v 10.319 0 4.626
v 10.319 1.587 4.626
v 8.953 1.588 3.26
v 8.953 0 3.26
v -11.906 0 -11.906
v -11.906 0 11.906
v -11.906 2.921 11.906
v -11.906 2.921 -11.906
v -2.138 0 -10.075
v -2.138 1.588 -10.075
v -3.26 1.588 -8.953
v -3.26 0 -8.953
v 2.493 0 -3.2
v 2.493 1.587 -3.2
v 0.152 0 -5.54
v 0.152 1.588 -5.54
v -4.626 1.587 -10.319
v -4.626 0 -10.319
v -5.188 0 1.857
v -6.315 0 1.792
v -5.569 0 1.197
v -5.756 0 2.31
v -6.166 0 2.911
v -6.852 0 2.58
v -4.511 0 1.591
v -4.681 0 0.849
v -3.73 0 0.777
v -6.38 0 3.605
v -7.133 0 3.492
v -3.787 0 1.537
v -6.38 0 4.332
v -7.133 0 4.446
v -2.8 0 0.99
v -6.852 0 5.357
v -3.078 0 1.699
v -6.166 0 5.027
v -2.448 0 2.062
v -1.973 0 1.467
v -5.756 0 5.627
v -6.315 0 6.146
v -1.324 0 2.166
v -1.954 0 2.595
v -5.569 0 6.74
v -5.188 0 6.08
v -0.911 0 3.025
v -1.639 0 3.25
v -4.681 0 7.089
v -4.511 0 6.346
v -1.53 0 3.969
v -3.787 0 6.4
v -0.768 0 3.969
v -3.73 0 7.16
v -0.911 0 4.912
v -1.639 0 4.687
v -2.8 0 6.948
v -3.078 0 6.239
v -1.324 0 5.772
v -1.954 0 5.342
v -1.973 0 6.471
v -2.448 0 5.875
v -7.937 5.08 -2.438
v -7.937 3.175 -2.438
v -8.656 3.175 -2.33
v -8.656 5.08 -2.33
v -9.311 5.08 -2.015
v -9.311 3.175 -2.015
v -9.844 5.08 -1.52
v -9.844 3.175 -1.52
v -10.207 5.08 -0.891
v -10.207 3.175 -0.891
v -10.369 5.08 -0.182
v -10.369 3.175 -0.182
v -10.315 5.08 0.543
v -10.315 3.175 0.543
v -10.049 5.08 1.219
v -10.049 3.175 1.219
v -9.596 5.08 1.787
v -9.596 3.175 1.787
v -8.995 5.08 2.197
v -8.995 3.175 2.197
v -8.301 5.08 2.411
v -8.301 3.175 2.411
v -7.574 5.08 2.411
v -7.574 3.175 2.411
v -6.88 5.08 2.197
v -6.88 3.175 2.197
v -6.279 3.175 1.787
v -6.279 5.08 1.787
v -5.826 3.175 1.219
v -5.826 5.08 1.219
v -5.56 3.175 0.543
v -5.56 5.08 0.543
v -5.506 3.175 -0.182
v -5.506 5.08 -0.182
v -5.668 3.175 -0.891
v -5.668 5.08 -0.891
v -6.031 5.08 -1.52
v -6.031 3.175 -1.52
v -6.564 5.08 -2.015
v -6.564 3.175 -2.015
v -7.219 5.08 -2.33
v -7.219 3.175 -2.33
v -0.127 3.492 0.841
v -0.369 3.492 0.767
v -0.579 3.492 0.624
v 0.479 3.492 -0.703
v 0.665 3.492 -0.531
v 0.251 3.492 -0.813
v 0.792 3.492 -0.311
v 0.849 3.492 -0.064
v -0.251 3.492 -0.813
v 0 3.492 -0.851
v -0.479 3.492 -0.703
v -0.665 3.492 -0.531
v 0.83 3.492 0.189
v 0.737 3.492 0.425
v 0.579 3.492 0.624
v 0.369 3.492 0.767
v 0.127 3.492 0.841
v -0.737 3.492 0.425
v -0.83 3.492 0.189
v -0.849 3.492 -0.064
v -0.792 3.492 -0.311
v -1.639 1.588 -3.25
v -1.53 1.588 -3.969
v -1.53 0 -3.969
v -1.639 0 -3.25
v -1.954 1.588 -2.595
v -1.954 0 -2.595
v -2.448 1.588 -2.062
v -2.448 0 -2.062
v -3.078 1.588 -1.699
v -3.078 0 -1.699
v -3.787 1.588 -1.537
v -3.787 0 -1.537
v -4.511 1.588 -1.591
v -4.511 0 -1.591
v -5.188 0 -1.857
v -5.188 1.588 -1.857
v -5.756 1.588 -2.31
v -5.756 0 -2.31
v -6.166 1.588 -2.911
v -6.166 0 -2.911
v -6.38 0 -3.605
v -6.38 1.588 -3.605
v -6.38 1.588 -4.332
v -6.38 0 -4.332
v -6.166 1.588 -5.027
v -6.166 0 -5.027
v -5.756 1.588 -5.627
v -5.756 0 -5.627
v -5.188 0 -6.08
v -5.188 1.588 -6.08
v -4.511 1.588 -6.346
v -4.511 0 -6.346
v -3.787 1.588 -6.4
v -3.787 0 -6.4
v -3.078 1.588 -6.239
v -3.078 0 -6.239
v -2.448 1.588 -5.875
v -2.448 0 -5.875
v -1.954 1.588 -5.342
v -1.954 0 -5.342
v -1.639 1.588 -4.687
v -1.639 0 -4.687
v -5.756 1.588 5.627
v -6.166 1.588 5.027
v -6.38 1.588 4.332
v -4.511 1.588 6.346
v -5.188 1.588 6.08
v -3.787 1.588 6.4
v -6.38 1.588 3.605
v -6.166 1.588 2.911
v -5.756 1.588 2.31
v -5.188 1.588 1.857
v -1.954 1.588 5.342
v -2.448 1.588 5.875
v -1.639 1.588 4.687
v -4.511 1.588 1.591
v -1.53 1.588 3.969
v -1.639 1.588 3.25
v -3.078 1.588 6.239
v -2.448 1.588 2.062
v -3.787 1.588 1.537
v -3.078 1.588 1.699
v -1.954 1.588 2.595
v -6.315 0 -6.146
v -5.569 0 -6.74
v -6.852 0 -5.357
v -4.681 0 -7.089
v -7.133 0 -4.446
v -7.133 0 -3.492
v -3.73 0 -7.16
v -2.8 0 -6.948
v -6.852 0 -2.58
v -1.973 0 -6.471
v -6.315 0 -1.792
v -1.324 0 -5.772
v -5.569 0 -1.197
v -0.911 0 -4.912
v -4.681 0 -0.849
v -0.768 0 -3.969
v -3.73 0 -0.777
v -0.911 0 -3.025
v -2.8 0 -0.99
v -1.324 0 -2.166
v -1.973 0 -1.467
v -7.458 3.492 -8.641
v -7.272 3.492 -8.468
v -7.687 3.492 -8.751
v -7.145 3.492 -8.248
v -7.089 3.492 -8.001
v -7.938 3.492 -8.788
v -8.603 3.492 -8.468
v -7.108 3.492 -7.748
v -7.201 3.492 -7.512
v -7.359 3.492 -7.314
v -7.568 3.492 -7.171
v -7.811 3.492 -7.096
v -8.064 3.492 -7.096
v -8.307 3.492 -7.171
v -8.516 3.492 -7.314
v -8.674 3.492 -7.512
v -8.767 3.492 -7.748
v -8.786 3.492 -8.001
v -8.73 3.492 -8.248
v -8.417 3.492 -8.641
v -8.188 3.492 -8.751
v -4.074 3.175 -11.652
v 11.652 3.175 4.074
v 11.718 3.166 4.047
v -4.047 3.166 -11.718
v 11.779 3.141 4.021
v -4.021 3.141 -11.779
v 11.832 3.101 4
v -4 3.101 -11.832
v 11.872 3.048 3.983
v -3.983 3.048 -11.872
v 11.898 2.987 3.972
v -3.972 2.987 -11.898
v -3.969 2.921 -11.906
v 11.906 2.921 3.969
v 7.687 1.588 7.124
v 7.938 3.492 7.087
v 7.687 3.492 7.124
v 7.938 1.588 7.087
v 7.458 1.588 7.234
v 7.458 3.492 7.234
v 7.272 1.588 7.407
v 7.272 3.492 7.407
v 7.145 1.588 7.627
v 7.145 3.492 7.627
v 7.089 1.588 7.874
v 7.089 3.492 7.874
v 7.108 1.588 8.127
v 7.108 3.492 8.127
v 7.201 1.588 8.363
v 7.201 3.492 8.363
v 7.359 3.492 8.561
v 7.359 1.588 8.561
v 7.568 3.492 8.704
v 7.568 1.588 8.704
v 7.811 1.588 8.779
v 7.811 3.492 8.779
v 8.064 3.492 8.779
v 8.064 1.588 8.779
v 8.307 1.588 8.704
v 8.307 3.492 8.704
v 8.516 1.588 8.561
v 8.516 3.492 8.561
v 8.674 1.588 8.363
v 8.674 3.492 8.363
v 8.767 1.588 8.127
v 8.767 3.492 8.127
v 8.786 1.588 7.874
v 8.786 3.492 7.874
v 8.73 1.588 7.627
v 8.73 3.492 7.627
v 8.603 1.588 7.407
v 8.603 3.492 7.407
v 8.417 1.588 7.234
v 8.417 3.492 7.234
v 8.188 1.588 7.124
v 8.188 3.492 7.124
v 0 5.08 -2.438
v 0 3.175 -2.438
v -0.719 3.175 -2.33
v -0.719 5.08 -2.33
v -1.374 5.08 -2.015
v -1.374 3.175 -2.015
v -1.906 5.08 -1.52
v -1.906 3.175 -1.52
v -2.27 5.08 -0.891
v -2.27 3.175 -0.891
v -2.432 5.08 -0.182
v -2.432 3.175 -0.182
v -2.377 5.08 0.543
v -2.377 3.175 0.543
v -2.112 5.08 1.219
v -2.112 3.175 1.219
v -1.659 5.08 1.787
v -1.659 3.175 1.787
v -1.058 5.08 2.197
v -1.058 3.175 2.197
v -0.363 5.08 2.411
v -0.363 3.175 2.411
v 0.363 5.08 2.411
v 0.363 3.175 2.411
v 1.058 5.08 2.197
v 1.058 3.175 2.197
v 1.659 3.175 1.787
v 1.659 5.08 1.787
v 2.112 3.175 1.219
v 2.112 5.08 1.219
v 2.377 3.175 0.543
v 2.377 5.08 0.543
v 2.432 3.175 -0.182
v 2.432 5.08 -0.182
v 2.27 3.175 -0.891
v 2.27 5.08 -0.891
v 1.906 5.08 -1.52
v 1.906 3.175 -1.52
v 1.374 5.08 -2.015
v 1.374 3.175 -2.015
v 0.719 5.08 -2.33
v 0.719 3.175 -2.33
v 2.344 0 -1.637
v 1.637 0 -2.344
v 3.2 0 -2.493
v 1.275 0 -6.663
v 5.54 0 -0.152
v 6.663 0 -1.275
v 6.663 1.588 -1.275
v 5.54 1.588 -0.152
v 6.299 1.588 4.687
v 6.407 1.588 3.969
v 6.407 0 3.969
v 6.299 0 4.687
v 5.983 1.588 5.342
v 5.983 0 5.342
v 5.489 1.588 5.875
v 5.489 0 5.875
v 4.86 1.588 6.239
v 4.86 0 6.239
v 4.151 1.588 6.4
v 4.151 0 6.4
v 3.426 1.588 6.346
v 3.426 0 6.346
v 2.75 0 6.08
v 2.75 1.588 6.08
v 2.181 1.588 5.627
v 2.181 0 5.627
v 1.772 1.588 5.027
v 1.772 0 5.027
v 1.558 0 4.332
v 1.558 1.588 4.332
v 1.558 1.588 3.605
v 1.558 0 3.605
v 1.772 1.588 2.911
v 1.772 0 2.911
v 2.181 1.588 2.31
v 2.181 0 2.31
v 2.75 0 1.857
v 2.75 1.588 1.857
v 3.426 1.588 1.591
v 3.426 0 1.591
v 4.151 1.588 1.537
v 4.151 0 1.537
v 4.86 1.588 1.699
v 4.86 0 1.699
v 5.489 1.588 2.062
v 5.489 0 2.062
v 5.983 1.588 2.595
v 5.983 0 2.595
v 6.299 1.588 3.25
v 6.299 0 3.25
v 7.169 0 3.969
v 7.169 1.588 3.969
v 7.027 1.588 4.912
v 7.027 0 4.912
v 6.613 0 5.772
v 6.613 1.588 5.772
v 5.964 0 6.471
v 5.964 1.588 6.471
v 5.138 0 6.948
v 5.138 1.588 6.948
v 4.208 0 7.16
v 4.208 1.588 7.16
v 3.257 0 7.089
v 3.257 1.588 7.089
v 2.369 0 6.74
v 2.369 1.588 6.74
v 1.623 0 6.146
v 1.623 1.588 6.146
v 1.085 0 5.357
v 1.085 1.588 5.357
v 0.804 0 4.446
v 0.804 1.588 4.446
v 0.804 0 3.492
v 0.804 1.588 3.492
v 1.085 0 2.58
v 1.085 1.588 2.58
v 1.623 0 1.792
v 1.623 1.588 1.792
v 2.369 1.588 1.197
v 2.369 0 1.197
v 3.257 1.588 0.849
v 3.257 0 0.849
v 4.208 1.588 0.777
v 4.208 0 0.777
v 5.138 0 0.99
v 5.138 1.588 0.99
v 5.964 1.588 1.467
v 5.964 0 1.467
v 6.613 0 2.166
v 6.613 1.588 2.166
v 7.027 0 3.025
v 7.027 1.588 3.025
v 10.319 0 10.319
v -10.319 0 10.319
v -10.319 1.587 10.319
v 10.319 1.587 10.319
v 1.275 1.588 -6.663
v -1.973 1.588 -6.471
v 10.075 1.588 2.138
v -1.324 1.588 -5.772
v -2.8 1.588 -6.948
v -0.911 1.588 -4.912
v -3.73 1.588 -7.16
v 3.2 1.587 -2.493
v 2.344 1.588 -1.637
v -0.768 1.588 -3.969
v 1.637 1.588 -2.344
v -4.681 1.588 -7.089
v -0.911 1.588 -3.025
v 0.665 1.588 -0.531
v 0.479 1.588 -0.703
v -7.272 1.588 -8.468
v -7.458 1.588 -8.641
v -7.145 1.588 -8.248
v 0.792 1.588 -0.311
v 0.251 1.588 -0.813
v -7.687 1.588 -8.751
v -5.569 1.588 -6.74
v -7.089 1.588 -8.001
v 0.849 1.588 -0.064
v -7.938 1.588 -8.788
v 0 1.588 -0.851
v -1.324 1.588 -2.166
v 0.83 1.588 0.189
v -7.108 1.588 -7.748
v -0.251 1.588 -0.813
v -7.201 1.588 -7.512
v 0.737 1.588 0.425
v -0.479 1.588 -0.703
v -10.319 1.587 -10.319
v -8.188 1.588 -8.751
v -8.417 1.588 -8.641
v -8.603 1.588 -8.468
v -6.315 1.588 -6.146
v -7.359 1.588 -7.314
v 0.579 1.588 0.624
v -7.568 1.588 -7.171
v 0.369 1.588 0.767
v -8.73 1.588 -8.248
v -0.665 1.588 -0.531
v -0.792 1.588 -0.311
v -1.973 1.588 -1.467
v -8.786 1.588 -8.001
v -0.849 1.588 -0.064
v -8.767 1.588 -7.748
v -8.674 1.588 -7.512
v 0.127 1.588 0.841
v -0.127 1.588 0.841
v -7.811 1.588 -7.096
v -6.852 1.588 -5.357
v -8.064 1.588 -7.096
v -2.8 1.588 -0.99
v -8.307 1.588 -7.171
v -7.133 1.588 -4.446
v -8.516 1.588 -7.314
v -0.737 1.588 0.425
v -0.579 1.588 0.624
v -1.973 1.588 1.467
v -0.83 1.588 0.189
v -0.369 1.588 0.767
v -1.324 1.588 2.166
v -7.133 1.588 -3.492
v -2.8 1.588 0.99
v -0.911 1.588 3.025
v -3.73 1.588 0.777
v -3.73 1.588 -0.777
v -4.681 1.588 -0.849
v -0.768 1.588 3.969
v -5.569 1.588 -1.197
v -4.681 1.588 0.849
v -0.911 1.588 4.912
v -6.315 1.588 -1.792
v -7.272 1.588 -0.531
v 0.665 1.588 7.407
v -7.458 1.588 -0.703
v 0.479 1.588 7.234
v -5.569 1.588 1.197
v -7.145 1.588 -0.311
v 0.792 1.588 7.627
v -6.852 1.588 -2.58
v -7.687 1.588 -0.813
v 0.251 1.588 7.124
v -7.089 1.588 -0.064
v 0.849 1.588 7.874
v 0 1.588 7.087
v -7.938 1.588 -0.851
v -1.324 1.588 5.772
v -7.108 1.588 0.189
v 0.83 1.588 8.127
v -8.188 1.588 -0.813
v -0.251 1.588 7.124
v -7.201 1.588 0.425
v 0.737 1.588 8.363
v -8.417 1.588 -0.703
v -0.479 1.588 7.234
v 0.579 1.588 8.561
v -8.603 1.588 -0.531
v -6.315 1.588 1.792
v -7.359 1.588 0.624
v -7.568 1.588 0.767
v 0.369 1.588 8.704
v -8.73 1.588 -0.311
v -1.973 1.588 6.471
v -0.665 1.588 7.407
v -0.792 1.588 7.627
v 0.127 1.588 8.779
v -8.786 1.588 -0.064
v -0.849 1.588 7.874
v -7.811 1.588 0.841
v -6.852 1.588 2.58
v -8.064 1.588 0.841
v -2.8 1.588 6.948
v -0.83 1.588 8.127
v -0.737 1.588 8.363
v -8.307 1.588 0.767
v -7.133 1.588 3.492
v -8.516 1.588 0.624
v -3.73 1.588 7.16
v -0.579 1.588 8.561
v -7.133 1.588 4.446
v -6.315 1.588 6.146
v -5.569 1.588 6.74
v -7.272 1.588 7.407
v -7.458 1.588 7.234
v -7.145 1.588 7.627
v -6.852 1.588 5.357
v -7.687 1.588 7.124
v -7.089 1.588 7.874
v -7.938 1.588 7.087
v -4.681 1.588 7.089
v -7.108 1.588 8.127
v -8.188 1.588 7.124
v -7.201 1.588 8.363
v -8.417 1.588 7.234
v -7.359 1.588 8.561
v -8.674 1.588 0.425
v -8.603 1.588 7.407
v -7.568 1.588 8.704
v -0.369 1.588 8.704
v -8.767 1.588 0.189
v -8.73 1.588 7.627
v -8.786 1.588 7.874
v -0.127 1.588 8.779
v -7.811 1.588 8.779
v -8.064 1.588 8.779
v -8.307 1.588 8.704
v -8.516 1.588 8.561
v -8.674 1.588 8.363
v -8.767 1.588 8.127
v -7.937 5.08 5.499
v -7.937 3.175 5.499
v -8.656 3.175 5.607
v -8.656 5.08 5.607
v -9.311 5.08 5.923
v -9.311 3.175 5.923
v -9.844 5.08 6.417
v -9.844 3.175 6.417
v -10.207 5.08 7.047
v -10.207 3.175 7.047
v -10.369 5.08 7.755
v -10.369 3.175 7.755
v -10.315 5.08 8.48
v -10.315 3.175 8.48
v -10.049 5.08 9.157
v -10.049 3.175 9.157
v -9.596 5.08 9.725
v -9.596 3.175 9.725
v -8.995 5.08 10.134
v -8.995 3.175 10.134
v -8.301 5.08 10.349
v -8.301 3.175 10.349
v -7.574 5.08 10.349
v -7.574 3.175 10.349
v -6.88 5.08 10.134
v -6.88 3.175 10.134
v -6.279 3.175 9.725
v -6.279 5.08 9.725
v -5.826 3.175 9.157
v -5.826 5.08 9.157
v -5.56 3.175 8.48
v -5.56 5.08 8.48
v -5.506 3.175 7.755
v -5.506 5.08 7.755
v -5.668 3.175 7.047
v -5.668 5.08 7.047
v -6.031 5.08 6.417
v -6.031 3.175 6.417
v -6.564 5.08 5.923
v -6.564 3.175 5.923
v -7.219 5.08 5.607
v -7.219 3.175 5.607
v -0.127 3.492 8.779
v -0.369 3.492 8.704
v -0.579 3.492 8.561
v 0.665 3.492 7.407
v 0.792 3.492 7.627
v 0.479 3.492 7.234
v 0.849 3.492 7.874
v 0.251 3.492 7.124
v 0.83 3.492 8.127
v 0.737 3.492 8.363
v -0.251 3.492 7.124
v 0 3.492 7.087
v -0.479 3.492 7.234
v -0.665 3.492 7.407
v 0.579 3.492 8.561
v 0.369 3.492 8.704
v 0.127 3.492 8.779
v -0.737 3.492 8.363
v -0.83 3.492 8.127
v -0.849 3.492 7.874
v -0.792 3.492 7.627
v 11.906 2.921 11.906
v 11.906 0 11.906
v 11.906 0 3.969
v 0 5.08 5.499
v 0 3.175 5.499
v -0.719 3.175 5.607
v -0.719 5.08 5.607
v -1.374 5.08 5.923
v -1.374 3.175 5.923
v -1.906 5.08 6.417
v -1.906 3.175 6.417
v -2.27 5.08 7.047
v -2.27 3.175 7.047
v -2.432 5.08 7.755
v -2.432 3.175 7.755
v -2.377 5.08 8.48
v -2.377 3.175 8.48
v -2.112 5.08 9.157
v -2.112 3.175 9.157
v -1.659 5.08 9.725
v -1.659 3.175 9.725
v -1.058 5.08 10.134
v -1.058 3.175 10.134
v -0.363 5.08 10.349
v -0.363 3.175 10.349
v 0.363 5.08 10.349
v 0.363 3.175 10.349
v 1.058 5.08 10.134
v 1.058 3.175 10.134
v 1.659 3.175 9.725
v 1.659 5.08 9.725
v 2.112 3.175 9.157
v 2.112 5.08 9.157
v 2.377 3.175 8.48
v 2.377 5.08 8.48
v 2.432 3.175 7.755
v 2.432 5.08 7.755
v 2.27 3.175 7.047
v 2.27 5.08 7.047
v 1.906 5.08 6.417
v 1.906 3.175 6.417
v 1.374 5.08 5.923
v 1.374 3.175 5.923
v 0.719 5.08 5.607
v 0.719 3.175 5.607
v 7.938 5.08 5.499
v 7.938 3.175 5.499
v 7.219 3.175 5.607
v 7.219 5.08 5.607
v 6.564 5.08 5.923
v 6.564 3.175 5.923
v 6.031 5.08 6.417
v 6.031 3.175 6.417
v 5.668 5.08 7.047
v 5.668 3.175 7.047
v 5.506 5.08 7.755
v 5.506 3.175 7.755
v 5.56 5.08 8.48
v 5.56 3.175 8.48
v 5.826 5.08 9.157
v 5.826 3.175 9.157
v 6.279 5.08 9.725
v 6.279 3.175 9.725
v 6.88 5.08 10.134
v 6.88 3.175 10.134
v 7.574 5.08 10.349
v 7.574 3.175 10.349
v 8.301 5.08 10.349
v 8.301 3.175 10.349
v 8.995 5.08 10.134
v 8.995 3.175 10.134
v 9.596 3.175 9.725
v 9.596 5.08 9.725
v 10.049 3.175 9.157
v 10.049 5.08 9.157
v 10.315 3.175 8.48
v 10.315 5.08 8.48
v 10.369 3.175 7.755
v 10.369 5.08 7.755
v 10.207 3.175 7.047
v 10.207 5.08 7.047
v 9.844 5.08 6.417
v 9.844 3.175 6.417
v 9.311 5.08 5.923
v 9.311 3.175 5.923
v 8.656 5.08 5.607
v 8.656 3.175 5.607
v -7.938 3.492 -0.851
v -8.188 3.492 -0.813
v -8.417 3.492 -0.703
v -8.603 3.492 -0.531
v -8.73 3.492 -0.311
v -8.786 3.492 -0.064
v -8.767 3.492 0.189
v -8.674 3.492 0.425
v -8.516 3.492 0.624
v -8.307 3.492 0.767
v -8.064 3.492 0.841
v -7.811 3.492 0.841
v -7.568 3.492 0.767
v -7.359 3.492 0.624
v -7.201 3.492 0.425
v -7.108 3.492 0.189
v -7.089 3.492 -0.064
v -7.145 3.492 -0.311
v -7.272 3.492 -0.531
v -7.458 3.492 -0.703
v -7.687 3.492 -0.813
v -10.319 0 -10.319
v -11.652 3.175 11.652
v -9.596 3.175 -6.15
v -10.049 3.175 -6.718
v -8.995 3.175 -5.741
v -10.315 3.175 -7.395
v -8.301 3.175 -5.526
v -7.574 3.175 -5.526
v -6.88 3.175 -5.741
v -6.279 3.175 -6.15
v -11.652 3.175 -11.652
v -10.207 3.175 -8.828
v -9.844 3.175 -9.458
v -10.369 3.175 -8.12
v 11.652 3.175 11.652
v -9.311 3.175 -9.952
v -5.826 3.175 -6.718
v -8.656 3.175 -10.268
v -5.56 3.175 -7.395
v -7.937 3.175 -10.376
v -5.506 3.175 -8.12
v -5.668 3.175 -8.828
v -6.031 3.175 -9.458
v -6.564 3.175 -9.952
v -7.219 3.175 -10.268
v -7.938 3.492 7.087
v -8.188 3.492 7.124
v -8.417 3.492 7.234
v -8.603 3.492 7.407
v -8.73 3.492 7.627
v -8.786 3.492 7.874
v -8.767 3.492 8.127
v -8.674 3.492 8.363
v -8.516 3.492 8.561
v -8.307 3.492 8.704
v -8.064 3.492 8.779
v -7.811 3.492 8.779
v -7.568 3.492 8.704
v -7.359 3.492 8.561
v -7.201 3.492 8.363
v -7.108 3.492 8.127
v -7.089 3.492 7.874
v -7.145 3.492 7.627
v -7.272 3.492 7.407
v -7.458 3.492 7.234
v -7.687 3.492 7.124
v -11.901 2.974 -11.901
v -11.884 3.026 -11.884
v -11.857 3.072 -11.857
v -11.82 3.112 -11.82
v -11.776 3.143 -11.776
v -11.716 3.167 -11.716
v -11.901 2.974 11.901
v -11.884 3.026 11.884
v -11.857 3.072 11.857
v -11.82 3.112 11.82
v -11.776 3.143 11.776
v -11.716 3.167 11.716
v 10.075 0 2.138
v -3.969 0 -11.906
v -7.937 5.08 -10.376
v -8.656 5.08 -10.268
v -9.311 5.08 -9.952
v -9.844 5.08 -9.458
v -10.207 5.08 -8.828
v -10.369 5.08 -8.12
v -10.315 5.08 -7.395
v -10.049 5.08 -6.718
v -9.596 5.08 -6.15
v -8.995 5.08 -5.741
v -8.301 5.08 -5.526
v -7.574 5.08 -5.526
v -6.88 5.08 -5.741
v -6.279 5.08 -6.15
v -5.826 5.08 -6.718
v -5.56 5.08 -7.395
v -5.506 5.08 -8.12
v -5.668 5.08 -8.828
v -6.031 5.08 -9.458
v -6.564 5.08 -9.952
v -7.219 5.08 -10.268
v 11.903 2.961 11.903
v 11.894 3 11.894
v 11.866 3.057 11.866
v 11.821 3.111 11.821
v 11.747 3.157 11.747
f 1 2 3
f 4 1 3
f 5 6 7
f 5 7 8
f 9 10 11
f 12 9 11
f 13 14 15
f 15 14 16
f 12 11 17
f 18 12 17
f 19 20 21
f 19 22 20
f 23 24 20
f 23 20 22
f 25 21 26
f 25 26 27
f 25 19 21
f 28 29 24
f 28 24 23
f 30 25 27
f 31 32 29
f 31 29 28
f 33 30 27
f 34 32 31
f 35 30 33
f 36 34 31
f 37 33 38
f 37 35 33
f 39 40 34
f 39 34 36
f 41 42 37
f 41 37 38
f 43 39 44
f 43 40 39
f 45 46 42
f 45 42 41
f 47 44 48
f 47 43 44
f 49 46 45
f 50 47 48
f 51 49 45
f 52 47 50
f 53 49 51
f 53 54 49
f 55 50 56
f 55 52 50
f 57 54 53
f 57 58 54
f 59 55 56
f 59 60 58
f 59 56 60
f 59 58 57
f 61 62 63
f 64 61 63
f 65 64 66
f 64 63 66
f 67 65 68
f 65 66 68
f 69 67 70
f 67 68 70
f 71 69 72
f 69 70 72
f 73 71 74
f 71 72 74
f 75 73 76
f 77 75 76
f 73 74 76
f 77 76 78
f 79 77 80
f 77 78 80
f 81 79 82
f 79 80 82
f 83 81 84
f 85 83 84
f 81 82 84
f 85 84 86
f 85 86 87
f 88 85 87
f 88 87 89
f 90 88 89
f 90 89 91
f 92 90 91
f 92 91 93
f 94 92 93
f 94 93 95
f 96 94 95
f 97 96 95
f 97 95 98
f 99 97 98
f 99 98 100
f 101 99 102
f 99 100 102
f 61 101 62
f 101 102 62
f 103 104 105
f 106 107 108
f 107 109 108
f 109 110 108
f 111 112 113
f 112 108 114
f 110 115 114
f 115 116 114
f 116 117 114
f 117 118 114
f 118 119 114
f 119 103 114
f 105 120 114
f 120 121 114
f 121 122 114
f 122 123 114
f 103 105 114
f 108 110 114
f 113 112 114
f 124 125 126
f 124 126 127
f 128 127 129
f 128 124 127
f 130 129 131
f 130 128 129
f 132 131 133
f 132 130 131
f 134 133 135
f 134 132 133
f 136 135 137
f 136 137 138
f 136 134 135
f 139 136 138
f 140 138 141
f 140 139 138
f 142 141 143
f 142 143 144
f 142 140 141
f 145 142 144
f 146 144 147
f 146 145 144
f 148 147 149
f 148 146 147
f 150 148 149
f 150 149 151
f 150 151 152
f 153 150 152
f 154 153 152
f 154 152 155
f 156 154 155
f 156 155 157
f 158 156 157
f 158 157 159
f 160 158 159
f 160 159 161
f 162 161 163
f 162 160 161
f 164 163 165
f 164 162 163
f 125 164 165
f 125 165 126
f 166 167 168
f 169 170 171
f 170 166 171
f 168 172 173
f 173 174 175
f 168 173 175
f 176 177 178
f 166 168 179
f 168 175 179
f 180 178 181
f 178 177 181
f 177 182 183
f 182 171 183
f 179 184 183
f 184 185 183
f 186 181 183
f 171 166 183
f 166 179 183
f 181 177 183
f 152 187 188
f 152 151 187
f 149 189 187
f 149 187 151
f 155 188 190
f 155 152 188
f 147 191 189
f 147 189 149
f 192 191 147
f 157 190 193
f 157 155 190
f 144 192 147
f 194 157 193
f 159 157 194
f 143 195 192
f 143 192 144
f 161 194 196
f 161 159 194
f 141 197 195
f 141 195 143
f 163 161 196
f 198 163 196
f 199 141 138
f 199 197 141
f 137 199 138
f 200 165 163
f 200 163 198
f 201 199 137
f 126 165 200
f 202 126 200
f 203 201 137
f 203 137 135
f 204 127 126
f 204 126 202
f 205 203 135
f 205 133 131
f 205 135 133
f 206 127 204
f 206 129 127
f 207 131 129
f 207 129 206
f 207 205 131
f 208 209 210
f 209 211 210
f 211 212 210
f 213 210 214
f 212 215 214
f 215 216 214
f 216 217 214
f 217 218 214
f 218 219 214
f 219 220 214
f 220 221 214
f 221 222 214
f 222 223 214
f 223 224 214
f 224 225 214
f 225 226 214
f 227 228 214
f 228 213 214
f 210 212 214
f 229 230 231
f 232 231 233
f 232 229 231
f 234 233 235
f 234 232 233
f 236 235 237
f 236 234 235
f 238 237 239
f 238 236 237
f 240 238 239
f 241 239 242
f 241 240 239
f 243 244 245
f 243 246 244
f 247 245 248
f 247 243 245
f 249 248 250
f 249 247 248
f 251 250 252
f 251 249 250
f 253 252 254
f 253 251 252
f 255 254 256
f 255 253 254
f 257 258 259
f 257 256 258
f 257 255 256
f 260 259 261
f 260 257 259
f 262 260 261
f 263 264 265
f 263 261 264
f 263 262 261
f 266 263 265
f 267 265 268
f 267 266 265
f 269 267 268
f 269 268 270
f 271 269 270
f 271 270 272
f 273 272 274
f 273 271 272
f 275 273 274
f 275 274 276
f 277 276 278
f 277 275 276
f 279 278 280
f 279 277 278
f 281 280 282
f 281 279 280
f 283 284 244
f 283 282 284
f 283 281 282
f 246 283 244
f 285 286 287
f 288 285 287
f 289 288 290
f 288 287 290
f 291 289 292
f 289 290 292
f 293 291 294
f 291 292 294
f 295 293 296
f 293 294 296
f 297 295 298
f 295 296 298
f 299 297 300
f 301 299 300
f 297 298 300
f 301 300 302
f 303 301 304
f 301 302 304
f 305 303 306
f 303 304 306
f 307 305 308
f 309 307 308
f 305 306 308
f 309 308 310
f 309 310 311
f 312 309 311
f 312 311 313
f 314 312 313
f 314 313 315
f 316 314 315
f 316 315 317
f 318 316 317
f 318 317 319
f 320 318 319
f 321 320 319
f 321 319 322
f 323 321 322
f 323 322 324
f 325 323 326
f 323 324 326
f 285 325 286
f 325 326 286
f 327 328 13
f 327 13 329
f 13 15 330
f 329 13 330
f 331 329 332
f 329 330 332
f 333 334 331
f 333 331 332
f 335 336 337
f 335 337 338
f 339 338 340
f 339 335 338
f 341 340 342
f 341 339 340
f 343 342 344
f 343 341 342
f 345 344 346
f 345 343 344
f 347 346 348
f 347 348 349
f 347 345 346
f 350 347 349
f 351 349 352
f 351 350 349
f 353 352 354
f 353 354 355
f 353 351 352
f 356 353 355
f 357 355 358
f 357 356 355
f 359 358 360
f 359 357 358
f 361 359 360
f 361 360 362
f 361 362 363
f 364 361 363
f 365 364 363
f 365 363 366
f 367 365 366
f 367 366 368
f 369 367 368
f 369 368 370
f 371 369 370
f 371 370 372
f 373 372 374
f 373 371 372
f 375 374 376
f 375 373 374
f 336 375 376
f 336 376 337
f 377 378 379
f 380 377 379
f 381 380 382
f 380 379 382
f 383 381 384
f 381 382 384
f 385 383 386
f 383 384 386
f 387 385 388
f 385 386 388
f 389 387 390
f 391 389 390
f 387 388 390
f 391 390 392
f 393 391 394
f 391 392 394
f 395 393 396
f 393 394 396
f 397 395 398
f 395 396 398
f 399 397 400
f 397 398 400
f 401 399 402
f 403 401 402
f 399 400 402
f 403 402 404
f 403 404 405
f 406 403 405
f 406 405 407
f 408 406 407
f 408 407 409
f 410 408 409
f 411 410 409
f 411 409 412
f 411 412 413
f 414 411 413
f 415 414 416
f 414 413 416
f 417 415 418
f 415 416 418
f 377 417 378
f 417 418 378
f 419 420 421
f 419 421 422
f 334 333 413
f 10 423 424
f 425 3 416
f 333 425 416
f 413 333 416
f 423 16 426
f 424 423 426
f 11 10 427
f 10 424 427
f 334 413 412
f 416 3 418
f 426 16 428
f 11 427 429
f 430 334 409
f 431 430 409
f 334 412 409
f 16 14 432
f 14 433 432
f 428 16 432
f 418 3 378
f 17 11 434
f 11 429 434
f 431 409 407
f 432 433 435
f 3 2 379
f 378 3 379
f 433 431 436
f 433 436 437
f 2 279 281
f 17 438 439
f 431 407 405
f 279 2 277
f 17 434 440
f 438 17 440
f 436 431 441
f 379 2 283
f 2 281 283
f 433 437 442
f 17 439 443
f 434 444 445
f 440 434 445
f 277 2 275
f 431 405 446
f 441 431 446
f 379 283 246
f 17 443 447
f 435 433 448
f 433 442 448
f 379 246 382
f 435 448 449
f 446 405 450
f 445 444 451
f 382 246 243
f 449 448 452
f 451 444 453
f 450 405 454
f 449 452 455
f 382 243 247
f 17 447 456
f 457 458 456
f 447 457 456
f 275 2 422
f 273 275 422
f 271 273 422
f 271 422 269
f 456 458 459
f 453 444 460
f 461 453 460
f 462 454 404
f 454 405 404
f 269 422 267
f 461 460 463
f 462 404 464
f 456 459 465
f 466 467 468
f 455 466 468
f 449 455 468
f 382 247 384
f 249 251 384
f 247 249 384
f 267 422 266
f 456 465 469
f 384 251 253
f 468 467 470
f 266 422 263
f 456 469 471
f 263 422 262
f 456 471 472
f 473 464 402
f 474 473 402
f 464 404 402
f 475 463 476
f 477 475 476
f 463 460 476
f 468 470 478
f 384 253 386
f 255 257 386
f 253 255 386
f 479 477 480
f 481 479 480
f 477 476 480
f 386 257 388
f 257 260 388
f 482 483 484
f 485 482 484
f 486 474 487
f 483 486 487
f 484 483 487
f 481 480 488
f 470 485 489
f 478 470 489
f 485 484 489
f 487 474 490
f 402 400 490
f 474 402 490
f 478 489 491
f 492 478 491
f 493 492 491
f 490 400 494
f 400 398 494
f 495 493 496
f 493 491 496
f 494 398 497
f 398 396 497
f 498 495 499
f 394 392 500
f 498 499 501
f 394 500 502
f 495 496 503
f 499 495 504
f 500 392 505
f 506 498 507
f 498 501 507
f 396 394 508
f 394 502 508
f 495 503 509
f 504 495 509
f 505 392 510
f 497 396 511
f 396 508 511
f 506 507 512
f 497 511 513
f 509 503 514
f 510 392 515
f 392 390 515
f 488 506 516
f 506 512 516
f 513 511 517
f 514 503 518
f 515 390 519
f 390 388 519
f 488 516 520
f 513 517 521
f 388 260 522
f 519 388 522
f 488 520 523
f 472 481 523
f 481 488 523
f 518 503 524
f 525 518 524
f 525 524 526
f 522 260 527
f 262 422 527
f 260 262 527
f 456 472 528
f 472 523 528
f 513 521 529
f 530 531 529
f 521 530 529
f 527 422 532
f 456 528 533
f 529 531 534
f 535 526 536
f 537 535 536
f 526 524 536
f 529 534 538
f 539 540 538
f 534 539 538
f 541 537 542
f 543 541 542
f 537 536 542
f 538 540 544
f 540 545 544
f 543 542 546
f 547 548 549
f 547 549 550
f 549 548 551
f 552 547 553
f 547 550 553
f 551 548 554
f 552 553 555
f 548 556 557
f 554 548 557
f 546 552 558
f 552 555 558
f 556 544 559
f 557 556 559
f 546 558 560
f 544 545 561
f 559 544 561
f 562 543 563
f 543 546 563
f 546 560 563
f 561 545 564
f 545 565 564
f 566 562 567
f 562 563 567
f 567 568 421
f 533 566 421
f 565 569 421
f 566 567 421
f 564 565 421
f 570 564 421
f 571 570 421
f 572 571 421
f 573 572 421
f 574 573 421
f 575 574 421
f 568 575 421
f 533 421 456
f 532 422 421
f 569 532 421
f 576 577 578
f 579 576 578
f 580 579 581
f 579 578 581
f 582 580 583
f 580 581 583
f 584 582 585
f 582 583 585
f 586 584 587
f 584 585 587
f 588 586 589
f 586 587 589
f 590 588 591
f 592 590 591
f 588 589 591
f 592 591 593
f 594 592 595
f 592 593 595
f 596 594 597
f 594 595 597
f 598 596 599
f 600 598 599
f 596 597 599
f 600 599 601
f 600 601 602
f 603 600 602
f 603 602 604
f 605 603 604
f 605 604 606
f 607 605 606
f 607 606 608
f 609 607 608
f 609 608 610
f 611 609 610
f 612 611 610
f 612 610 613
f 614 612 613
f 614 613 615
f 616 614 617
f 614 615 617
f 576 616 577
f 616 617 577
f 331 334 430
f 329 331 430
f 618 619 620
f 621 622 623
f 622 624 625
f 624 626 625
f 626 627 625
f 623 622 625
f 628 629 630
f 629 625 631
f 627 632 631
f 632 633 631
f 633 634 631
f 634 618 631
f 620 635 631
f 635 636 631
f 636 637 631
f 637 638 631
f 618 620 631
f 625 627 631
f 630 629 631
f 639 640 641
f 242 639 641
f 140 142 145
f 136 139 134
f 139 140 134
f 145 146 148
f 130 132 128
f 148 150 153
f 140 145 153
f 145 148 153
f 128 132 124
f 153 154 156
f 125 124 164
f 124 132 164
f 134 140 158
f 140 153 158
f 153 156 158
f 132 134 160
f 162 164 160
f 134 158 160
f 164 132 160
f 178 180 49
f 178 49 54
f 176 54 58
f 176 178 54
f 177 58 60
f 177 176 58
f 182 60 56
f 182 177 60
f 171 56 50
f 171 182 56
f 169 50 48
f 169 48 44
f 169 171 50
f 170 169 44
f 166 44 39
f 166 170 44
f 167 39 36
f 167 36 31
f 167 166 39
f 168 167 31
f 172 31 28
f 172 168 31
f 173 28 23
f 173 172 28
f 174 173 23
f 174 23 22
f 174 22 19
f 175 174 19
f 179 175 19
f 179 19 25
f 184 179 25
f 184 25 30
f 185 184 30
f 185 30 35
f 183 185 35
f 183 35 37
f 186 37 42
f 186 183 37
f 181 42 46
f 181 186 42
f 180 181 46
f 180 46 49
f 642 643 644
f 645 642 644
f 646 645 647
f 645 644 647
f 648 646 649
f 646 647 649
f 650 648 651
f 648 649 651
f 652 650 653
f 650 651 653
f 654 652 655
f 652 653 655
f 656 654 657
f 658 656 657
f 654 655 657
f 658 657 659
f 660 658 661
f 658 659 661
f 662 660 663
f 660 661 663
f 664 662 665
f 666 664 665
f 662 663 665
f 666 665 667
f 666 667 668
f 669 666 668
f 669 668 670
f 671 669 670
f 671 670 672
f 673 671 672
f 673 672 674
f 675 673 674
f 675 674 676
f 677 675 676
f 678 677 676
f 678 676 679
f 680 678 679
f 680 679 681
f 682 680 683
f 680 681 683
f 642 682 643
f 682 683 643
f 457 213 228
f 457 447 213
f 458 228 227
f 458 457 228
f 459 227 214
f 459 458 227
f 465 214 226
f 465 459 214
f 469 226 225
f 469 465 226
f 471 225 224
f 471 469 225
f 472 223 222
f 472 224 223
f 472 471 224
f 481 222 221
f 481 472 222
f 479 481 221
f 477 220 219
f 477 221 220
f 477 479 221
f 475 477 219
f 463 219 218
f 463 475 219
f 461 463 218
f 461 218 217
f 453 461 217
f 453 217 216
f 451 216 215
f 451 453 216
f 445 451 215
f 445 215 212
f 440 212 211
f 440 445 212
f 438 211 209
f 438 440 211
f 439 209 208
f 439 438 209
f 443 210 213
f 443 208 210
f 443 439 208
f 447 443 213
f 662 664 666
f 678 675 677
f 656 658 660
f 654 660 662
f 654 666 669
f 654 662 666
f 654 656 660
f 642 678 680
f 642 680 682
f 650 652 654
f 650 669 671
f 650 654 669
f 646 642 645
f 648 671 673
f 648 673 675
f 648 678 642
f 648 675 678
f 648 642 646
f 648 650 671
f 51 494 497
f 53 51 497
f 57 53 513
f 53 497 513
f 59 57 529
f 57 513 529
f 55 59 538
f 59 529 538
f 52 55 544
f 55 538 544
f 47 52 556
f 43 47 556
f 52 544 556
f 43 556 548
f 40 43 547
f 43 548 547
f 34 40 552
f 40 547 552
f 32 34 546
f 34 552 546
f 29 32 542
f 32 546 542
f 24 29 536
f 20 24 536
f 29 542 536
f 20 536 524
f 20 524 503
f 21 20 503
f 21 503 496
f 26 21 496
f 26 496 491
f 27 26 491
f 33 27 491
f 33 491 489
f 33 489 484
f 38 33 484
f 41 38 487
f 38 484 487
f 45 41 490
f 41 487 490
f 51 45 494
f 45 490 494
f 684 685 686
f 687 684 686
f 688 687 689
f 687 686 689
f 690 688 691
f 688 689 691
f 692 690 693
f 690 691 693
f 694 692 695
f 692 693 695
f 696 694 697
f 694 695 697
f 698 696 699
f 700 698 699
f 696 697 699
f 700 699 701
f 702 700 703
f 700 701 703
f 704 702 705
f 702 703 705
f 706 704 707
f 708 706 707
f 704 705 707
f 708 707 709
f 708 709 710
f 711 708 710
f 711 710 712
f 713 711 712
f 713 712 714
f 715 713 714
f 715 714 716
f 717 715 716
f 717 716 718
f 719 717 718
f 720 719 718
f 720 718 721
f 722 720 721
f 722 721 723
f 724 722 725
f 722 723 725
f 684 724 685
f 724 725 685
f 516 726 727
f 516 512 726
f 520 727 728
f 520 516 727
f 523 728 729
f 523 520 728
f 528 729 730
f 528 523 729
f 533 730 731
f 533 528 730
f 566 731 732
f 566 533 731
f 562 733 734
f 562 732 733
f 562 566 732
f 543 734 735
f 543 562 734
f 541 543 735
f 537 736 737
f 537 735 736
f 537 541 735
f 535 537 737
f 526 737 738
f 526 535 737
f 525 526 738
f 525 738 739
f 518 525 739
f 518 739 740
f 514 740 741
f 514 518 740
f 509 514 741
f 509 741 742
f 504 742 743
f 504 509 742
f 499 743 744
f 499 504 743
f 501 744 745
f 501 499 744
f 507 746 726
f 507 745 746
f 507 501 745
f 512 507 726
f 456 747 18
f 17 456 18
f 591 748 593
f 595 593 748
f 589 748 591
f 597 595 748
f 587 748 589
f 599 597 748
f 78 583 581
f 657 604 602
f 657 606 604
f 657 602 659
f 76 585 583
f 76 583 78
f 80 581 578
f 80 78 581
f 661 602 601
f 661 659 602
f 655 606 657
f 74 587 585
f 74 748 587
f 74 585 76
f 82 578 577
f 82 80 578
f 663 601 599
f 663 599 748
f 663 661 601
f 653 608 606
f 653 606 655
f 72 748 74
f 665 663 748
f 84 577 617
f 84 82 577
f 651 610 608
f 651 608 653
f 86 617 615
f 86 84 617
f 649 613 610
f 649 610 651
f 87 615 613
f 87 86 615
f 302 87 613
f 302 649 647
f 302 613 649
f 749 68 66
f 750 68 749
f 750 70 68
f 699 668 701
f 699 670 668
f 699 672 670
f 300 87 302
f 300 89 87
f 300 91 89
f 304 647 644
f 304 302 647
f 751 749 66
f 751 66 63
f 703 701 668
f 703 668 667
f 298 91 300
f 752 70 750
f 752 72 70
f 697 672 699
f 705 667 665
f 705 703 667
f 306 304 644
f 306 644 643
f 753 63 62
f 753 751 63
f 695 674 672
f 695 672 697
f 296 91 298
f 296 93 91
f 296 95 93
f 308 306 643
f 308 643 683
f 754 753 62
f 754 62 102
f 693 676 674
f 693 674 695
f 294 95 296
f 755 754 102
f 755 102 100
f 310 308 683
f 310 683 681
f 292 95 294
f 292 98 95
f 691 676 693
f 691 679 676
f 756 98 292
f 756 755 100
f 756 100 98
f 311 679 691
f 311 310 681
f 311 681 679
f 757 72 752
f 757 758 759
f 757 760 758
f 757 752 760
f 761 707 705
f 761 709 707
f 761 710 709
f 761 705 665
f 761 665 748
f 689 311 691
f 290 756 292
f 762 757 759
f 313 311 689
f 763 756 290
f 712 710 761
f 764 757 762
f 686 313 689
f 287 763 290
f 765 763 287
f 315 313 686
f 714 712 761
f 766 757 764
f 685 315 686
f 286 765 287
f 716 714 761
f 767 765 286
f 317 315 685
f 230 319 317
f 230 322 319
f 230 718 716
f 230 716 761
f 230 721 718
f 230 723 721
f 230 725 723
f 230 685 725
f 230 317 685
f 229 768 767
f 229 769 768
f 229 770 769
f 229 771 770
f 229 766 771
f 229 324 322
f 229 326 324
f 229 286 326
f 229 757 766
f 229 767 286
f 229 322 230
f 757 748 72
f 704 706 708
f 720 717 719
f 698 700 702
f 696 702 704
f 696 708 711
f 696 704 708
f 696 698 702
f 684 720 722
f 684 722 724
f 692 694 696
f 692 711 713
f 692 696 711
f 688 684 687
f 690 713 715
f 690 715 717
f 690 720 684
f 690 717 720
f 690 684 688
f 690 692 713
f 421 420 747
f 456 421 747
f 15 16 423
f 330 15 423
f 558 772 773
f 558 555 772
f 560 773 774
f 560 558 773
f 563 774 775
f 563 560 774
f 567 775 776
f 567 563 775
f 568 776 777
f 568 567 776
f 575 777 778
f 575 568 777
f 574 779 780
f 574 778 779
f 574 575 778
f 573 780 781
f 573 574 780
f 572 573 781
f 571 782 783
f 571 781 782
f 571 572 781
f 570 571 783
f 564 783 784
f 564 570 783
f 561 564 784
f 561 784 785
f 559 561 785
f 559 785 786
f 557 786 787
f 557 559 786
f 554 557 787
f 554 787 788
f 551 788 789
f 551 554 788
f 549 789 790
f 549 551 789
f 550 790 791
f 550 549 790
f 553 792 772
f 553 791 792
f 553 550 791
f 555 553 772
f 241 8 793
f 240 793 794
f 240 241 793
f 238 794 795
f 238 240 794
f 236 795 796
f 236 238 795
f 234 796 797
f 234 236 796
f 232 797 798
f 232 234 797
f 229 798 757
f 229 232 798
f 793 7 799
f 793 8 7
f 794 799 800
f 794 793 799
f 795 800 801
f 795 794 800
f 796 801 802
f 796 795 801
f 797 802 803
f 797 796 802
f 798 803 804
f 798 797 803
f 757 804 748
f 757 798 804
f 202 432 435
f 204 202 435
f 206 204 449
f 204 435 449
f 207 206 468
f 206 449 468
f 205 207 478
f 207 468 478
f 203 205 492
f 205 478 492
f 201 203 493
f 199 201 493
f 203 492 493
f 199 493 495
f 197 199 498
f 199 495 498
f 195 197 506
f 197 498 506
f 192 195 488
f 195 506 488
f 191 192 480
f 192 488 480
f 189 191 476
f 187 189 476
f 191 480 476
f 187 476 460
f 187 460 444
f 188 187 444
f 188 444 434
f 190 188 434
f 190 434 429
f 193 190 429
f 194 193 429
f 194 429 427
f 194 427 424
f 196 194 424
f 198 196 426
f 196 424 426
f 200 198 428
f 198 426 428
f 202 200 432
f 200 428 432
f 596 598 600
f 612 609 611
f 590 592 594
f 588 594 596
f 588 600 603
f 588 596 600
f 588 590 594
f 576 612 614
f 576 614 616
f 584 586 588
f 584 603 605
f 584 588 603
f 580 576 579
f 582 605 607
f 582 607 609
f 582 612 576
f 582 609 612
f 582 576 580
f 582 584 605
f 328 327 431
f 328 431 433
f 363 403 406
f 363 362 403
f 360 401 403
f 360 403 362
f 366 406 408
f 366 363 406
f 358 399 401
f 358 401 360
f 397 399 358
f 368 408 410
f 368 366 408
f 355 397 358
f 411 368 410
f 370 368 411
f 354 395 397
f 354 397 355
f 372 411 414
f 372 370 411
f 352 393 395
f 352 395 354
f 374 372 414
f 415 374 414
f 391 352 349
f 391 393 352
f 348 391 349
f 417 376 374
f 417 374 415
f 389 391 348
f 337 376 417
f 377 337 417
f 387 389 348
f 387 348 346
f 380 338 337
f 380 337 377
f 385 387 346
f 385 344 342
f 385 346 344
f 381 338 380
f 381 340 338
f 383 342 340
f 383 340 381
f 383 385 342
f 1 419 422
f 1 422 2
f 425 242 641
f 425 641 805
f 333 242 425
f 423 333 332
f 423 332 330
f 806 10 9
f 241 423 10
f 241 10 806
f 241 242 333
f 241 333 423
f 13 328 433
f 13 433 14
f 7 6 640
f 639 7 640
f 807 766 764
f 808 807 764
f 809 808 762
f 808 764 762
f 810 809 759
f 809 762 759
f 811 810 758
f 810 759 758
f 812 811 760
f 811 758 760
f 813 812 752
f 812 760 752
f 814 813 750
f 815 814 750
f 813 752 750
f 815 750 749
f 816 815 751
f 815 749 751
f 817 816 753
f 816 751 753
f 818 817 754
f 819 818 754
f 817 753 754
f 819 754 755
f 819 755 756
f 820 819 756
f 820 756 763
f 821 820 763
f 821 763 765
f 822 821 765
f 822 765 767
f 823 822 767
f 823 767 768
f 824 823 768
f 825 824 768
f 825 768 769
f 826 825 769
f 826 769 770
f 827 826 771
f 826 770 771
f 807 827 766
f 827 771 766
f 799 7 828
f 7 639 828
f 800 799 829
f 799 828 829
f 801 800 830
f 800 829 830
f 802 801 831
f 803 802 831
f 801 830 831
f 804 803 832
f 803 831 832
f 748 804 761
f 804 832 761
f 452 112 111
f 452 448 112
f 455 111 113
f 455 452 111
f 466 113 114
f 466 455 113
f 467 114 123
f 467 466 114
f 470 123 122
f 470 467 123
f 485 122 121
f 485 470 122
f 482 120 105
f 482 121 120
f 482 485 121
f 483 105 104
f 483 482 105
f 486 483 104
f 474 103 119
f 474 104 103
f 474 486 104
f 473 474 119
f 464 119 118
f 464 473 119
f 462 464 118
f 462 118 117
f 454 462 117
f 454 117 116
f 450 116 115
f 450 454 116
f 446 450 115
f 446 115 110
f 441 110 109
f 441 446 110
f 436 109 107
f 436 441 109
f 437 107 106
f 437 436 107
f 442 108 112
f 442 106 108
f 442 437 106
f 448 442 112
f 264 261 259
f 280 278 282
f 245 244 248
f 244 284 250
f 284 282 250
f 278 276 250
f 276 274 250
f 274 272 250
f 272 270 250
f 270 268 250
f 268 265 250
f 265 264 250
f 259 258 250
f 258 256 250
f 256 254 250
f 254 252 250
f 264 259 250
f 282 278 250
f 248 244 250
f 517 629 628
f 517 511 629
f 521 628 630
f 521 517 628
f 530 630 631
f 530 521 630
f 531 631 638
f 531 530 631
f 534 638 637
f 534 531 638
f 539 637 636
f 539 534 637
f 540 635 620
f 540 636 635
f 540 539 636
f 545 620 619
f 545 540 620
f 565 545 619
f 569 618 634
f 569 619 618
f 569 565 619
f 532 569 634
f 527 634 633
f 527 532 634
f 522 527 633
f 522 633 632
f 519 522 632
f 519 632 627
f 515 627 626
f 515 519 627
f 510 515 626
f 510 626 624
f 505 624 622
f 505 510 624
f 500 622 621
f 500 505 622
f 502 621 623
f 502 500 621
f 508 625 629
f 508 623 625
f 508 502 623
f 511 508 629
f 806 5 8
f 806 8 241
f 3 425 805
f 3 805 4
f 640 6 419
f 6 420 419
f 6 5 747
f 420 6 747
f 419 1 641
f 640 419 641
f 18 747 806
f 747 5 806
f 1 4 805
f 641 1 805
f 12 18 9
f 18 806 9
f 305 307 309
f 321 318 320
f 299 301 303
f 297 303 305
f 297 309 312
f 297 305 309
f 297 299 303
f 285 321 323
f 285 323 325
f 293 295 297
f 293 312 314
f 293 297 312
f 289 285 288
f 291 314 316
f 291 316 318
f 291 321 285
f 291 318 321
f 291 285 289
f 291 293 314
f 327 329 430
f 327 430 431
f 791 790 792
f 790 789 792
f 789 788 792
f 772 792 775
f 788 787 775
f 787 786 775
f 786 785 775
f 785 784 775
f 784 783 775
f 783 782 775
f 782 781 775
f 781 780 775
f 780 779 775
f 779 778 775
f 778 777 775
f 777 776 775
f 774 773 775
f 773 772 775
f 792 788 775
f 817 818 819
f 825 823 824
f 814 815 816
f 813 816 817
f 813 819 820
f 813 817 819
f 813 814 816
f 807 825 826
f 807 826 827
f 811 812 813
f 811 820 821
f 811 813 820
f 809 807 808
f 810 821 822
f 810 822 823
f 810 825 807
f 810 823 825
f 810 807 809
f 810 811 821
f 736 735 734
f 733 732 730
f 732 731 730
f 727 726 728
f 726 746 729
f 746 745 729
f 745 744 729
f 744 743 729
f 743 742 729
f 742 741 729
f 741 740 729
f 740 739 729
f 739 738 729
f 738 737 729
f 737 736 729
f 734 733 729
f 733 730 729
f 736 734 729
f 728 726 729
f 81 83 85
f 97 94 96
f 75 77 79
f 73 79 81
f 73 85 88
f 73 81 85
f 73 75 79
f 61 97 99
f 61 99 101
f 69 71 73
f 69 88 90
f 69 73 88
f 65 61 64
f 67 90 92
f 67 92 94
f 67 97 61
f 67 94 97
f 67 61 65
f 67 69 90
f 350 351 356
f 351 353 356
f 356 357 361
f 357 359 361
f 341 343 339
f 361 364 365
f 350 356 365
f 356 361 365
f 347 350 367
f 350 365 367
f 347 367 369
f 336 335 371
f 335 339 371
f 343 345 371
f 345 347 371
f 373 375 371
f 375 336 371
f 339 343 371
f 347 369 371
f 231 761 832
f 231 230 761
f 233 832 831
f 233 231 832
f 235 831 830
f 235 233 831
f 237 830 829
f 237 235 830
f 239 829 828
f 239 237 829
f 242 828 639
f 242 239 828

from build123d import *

# Parameters (mm, degrees)
SKETCH1_W                = 23.8125
SKETCH1_H                = 23.8125
BASE_EXTRUDE_DEPTH       = 3.175
SKETCH2_R                = 2.4384
BOSS_EXTRUDE1_DEPTH      = 1.905
LPATTERN4_COUNT          = 3
LPATTERN4_PITCH          = 7.9375
LPATTERN4_COUNT_DIR2     = 3
LPATTERN4_PITCH_DIR2     = 7.9375
CUT_EXTRUDE1_DEPTH       = 18.134707559
SHELL1_T                 = -1.5875
SKETCH3_R                = 3.2004
SKETCH3_R_2              = 2.4384
INSDOT_DEPTH             = 1.5875
SKETCH5_R                = 3.2004
SKETCH5_R_2              = 2.4384
BOSS_EXTRUDE_THIN1_DEPTH = 1.5875
SKETCH6_R                = 3.2004
SKETCH6_R_2              = 2.4384
BOSS_EXTRUDE_THIN2_DEPTH = 1.5875
CUT_EXTRUDE2_START       = -1.5875
CUT_EXTRUDE2_DEPTH       = 1.5875
BOSS_EXTRUDE_THIN3_REACH = 19.588
FILLET1_R                = 0.254


with BuildPart() as part:
    # Sketch1 → Base-Extrude (new body)
    with BuildSketch(Plane(origin=(0, 0, 0), x_dir=(1, 0, 0), z_dir=(0, 1, 0))):
        Rectangle(SKETCH1_W, SKETCH1_H)
    extrude(amount=BASE_EXTRUDE_DEPTH)

    # Sketch2 → Boss-Extrude1 (add)
    with BuildSketch(Plane(origin=(0, 3.175, 0), x_dir=(-1, 0, 0), z_dir=(0, 1, 0))):
        with Locations(Location((7.9375, 7.9375, 0), (0, 0, 270))):
            Circle(SKETCH2_R)
    boss_extrude1 = extrude(amount=BOSS_EXTRUDE1_DEPTH)

    # LPattern4: Boss-Extrude1 3 × 3, 3 skipped
    with Locations(*[(i * LPATTERN4_PITCH, 0, -j * LPATTERN4_PITCH_DIR2) for i in range(LPATTERN4_COUNT) for j in range(LPATTERN4_COUNT_DIR2) if (i, j) not in ((0, 0), (1, 2), (2, 1), (2, 2))]):
        add(boss_extrude1)

    # Sketch4 → Cut-Extrude1 (cut, through all)
    with BuildSketch(Plane(origin=(0, 3.175, 0), x_dir=(-1, 0, 0), z_dir=(0, 1, 0))):
        Polygon((-11.90625, 3.96875), (3.96875, -11.90625), (-11.90625, -11.90625), align=None)
    extrude(amount=-CUT_EXTRUDE1_DEPTH, mode=Mode.SUBTRACT)

    # Shell1
    shell1_openings = [part.faces().sort_by_distance(p)[0] for p in [
        (-1.889880952, 0, 1.889880952),
    ]]
    offset(amount=SHELL1_T, openings=shell1_openings, kind=Kind.INTERSECTION)

    # Sketch3 → InsDot (add)
    with BuildSketch(Plane.XZ.offset(-1.5875)):
        with Locations((-3.96875, -3.96875)):
            Circle(SKETCH3_R)
        with Locations((-3.96875, -3.96875)):
            Circle(SKETCH3_R_2, mode=Mode.SUBTRACT)
    extrude(amount=INSDOT_DEPTH)

    # Sketch5 → Boss-Extrude-Thin1 (add)
    with BuildSketch(Plane(origin=(-0.918447423, 1.5875, 6.872038401), x_dir=(1, 0, 0), z_dir=(0, -1, 0))):
        with Locations((-3.050302577, -2.903288401)):
            Circle(SKETCH5_R)
        with Locations((-3.050302577, -2.903288401)):
            Circle(SKETCH5_R_2, mode=Mode.SUBTRACT)
    extrude(amount=BOSS_EXTRUDE_THIN1_DEPTH)

    # Sketch6 → Boss-Extrude-Thin2 (add)
    with BuildSketch(Plane(origin=(7.701488358, 1.5875, 8.898864744), x_dir=(1, 0, 0), z_dir=(0, -1, 0))):
        with Locations((-3.732738358, -4.930114744)):
            Circle(SKETCH6_R)
        with Locations((-3.732738358, -4.930114744)):
            Circle(SKETCH6_R_2, mode=Mode.SUBTRACT)
    extrude(amount=BOSS_EXTRUDE_THIN2_DEPTH)

    # Sketch7 → Cut-Extrude2 (cut)
    with BuildSketch(Plane.XZ.offset(CUT_EXTRUDE2_START)):
        Polygon((5.540294821, -0.152141149), (6.662826836, -1.274673164), (10.075324162, 2.137824162), (8.952792147, 3.260356177), align=None)
        Polygon((-3.260356177, -8.952792147), (0.152141149, -5.540294821), (1.274673164, -6.662826836), (-2.137824162, -10.075324162), align=None)
    extrude(amount=CUT_EXTRUDE2_DEPTH, mode=Mode.SUBTRACT)

    # Sketch8 → Boss-Extrude-Thin3 (add, up to next)
    with BuildSketch(Plane.XZ, mode=Mode.PRIVATE) as boss_extrude_thin3_sk1:
        Polygon((3.241680915, -2.534574133), (2.343655303, -1.636548521), (1.636548521, -2.343655303), (2.534574133, -3.241680915), align=None)
    boss_extrude_thin3_tool1 = extrude(boss_extrude_thin3_sk1.sketch, amount=-BOSS_EXTRUDE_THIN3_REACH, mode=Mode.PRIVATE) - part.part
    add(boss_extrude_thin3_tool1.solids().sort_by_distance((2.439115, 0, -2.439115))[0])

    # Fillet1
    fillet1_edges = [part.edges().sort_by_distance(p)[0] for p in [
        (11.90625, 3.175, 7.9375),
        (-7.9375, 3.175, -11.90625),
        (3.96875, 3.175, -3.96875),
        (-11.90625, 3.175, 0),
        (0, 3.175, 11.90625),
    ]]
    fillet(fillet1_edges, radius=FILLET1_R)


solid = part.part
